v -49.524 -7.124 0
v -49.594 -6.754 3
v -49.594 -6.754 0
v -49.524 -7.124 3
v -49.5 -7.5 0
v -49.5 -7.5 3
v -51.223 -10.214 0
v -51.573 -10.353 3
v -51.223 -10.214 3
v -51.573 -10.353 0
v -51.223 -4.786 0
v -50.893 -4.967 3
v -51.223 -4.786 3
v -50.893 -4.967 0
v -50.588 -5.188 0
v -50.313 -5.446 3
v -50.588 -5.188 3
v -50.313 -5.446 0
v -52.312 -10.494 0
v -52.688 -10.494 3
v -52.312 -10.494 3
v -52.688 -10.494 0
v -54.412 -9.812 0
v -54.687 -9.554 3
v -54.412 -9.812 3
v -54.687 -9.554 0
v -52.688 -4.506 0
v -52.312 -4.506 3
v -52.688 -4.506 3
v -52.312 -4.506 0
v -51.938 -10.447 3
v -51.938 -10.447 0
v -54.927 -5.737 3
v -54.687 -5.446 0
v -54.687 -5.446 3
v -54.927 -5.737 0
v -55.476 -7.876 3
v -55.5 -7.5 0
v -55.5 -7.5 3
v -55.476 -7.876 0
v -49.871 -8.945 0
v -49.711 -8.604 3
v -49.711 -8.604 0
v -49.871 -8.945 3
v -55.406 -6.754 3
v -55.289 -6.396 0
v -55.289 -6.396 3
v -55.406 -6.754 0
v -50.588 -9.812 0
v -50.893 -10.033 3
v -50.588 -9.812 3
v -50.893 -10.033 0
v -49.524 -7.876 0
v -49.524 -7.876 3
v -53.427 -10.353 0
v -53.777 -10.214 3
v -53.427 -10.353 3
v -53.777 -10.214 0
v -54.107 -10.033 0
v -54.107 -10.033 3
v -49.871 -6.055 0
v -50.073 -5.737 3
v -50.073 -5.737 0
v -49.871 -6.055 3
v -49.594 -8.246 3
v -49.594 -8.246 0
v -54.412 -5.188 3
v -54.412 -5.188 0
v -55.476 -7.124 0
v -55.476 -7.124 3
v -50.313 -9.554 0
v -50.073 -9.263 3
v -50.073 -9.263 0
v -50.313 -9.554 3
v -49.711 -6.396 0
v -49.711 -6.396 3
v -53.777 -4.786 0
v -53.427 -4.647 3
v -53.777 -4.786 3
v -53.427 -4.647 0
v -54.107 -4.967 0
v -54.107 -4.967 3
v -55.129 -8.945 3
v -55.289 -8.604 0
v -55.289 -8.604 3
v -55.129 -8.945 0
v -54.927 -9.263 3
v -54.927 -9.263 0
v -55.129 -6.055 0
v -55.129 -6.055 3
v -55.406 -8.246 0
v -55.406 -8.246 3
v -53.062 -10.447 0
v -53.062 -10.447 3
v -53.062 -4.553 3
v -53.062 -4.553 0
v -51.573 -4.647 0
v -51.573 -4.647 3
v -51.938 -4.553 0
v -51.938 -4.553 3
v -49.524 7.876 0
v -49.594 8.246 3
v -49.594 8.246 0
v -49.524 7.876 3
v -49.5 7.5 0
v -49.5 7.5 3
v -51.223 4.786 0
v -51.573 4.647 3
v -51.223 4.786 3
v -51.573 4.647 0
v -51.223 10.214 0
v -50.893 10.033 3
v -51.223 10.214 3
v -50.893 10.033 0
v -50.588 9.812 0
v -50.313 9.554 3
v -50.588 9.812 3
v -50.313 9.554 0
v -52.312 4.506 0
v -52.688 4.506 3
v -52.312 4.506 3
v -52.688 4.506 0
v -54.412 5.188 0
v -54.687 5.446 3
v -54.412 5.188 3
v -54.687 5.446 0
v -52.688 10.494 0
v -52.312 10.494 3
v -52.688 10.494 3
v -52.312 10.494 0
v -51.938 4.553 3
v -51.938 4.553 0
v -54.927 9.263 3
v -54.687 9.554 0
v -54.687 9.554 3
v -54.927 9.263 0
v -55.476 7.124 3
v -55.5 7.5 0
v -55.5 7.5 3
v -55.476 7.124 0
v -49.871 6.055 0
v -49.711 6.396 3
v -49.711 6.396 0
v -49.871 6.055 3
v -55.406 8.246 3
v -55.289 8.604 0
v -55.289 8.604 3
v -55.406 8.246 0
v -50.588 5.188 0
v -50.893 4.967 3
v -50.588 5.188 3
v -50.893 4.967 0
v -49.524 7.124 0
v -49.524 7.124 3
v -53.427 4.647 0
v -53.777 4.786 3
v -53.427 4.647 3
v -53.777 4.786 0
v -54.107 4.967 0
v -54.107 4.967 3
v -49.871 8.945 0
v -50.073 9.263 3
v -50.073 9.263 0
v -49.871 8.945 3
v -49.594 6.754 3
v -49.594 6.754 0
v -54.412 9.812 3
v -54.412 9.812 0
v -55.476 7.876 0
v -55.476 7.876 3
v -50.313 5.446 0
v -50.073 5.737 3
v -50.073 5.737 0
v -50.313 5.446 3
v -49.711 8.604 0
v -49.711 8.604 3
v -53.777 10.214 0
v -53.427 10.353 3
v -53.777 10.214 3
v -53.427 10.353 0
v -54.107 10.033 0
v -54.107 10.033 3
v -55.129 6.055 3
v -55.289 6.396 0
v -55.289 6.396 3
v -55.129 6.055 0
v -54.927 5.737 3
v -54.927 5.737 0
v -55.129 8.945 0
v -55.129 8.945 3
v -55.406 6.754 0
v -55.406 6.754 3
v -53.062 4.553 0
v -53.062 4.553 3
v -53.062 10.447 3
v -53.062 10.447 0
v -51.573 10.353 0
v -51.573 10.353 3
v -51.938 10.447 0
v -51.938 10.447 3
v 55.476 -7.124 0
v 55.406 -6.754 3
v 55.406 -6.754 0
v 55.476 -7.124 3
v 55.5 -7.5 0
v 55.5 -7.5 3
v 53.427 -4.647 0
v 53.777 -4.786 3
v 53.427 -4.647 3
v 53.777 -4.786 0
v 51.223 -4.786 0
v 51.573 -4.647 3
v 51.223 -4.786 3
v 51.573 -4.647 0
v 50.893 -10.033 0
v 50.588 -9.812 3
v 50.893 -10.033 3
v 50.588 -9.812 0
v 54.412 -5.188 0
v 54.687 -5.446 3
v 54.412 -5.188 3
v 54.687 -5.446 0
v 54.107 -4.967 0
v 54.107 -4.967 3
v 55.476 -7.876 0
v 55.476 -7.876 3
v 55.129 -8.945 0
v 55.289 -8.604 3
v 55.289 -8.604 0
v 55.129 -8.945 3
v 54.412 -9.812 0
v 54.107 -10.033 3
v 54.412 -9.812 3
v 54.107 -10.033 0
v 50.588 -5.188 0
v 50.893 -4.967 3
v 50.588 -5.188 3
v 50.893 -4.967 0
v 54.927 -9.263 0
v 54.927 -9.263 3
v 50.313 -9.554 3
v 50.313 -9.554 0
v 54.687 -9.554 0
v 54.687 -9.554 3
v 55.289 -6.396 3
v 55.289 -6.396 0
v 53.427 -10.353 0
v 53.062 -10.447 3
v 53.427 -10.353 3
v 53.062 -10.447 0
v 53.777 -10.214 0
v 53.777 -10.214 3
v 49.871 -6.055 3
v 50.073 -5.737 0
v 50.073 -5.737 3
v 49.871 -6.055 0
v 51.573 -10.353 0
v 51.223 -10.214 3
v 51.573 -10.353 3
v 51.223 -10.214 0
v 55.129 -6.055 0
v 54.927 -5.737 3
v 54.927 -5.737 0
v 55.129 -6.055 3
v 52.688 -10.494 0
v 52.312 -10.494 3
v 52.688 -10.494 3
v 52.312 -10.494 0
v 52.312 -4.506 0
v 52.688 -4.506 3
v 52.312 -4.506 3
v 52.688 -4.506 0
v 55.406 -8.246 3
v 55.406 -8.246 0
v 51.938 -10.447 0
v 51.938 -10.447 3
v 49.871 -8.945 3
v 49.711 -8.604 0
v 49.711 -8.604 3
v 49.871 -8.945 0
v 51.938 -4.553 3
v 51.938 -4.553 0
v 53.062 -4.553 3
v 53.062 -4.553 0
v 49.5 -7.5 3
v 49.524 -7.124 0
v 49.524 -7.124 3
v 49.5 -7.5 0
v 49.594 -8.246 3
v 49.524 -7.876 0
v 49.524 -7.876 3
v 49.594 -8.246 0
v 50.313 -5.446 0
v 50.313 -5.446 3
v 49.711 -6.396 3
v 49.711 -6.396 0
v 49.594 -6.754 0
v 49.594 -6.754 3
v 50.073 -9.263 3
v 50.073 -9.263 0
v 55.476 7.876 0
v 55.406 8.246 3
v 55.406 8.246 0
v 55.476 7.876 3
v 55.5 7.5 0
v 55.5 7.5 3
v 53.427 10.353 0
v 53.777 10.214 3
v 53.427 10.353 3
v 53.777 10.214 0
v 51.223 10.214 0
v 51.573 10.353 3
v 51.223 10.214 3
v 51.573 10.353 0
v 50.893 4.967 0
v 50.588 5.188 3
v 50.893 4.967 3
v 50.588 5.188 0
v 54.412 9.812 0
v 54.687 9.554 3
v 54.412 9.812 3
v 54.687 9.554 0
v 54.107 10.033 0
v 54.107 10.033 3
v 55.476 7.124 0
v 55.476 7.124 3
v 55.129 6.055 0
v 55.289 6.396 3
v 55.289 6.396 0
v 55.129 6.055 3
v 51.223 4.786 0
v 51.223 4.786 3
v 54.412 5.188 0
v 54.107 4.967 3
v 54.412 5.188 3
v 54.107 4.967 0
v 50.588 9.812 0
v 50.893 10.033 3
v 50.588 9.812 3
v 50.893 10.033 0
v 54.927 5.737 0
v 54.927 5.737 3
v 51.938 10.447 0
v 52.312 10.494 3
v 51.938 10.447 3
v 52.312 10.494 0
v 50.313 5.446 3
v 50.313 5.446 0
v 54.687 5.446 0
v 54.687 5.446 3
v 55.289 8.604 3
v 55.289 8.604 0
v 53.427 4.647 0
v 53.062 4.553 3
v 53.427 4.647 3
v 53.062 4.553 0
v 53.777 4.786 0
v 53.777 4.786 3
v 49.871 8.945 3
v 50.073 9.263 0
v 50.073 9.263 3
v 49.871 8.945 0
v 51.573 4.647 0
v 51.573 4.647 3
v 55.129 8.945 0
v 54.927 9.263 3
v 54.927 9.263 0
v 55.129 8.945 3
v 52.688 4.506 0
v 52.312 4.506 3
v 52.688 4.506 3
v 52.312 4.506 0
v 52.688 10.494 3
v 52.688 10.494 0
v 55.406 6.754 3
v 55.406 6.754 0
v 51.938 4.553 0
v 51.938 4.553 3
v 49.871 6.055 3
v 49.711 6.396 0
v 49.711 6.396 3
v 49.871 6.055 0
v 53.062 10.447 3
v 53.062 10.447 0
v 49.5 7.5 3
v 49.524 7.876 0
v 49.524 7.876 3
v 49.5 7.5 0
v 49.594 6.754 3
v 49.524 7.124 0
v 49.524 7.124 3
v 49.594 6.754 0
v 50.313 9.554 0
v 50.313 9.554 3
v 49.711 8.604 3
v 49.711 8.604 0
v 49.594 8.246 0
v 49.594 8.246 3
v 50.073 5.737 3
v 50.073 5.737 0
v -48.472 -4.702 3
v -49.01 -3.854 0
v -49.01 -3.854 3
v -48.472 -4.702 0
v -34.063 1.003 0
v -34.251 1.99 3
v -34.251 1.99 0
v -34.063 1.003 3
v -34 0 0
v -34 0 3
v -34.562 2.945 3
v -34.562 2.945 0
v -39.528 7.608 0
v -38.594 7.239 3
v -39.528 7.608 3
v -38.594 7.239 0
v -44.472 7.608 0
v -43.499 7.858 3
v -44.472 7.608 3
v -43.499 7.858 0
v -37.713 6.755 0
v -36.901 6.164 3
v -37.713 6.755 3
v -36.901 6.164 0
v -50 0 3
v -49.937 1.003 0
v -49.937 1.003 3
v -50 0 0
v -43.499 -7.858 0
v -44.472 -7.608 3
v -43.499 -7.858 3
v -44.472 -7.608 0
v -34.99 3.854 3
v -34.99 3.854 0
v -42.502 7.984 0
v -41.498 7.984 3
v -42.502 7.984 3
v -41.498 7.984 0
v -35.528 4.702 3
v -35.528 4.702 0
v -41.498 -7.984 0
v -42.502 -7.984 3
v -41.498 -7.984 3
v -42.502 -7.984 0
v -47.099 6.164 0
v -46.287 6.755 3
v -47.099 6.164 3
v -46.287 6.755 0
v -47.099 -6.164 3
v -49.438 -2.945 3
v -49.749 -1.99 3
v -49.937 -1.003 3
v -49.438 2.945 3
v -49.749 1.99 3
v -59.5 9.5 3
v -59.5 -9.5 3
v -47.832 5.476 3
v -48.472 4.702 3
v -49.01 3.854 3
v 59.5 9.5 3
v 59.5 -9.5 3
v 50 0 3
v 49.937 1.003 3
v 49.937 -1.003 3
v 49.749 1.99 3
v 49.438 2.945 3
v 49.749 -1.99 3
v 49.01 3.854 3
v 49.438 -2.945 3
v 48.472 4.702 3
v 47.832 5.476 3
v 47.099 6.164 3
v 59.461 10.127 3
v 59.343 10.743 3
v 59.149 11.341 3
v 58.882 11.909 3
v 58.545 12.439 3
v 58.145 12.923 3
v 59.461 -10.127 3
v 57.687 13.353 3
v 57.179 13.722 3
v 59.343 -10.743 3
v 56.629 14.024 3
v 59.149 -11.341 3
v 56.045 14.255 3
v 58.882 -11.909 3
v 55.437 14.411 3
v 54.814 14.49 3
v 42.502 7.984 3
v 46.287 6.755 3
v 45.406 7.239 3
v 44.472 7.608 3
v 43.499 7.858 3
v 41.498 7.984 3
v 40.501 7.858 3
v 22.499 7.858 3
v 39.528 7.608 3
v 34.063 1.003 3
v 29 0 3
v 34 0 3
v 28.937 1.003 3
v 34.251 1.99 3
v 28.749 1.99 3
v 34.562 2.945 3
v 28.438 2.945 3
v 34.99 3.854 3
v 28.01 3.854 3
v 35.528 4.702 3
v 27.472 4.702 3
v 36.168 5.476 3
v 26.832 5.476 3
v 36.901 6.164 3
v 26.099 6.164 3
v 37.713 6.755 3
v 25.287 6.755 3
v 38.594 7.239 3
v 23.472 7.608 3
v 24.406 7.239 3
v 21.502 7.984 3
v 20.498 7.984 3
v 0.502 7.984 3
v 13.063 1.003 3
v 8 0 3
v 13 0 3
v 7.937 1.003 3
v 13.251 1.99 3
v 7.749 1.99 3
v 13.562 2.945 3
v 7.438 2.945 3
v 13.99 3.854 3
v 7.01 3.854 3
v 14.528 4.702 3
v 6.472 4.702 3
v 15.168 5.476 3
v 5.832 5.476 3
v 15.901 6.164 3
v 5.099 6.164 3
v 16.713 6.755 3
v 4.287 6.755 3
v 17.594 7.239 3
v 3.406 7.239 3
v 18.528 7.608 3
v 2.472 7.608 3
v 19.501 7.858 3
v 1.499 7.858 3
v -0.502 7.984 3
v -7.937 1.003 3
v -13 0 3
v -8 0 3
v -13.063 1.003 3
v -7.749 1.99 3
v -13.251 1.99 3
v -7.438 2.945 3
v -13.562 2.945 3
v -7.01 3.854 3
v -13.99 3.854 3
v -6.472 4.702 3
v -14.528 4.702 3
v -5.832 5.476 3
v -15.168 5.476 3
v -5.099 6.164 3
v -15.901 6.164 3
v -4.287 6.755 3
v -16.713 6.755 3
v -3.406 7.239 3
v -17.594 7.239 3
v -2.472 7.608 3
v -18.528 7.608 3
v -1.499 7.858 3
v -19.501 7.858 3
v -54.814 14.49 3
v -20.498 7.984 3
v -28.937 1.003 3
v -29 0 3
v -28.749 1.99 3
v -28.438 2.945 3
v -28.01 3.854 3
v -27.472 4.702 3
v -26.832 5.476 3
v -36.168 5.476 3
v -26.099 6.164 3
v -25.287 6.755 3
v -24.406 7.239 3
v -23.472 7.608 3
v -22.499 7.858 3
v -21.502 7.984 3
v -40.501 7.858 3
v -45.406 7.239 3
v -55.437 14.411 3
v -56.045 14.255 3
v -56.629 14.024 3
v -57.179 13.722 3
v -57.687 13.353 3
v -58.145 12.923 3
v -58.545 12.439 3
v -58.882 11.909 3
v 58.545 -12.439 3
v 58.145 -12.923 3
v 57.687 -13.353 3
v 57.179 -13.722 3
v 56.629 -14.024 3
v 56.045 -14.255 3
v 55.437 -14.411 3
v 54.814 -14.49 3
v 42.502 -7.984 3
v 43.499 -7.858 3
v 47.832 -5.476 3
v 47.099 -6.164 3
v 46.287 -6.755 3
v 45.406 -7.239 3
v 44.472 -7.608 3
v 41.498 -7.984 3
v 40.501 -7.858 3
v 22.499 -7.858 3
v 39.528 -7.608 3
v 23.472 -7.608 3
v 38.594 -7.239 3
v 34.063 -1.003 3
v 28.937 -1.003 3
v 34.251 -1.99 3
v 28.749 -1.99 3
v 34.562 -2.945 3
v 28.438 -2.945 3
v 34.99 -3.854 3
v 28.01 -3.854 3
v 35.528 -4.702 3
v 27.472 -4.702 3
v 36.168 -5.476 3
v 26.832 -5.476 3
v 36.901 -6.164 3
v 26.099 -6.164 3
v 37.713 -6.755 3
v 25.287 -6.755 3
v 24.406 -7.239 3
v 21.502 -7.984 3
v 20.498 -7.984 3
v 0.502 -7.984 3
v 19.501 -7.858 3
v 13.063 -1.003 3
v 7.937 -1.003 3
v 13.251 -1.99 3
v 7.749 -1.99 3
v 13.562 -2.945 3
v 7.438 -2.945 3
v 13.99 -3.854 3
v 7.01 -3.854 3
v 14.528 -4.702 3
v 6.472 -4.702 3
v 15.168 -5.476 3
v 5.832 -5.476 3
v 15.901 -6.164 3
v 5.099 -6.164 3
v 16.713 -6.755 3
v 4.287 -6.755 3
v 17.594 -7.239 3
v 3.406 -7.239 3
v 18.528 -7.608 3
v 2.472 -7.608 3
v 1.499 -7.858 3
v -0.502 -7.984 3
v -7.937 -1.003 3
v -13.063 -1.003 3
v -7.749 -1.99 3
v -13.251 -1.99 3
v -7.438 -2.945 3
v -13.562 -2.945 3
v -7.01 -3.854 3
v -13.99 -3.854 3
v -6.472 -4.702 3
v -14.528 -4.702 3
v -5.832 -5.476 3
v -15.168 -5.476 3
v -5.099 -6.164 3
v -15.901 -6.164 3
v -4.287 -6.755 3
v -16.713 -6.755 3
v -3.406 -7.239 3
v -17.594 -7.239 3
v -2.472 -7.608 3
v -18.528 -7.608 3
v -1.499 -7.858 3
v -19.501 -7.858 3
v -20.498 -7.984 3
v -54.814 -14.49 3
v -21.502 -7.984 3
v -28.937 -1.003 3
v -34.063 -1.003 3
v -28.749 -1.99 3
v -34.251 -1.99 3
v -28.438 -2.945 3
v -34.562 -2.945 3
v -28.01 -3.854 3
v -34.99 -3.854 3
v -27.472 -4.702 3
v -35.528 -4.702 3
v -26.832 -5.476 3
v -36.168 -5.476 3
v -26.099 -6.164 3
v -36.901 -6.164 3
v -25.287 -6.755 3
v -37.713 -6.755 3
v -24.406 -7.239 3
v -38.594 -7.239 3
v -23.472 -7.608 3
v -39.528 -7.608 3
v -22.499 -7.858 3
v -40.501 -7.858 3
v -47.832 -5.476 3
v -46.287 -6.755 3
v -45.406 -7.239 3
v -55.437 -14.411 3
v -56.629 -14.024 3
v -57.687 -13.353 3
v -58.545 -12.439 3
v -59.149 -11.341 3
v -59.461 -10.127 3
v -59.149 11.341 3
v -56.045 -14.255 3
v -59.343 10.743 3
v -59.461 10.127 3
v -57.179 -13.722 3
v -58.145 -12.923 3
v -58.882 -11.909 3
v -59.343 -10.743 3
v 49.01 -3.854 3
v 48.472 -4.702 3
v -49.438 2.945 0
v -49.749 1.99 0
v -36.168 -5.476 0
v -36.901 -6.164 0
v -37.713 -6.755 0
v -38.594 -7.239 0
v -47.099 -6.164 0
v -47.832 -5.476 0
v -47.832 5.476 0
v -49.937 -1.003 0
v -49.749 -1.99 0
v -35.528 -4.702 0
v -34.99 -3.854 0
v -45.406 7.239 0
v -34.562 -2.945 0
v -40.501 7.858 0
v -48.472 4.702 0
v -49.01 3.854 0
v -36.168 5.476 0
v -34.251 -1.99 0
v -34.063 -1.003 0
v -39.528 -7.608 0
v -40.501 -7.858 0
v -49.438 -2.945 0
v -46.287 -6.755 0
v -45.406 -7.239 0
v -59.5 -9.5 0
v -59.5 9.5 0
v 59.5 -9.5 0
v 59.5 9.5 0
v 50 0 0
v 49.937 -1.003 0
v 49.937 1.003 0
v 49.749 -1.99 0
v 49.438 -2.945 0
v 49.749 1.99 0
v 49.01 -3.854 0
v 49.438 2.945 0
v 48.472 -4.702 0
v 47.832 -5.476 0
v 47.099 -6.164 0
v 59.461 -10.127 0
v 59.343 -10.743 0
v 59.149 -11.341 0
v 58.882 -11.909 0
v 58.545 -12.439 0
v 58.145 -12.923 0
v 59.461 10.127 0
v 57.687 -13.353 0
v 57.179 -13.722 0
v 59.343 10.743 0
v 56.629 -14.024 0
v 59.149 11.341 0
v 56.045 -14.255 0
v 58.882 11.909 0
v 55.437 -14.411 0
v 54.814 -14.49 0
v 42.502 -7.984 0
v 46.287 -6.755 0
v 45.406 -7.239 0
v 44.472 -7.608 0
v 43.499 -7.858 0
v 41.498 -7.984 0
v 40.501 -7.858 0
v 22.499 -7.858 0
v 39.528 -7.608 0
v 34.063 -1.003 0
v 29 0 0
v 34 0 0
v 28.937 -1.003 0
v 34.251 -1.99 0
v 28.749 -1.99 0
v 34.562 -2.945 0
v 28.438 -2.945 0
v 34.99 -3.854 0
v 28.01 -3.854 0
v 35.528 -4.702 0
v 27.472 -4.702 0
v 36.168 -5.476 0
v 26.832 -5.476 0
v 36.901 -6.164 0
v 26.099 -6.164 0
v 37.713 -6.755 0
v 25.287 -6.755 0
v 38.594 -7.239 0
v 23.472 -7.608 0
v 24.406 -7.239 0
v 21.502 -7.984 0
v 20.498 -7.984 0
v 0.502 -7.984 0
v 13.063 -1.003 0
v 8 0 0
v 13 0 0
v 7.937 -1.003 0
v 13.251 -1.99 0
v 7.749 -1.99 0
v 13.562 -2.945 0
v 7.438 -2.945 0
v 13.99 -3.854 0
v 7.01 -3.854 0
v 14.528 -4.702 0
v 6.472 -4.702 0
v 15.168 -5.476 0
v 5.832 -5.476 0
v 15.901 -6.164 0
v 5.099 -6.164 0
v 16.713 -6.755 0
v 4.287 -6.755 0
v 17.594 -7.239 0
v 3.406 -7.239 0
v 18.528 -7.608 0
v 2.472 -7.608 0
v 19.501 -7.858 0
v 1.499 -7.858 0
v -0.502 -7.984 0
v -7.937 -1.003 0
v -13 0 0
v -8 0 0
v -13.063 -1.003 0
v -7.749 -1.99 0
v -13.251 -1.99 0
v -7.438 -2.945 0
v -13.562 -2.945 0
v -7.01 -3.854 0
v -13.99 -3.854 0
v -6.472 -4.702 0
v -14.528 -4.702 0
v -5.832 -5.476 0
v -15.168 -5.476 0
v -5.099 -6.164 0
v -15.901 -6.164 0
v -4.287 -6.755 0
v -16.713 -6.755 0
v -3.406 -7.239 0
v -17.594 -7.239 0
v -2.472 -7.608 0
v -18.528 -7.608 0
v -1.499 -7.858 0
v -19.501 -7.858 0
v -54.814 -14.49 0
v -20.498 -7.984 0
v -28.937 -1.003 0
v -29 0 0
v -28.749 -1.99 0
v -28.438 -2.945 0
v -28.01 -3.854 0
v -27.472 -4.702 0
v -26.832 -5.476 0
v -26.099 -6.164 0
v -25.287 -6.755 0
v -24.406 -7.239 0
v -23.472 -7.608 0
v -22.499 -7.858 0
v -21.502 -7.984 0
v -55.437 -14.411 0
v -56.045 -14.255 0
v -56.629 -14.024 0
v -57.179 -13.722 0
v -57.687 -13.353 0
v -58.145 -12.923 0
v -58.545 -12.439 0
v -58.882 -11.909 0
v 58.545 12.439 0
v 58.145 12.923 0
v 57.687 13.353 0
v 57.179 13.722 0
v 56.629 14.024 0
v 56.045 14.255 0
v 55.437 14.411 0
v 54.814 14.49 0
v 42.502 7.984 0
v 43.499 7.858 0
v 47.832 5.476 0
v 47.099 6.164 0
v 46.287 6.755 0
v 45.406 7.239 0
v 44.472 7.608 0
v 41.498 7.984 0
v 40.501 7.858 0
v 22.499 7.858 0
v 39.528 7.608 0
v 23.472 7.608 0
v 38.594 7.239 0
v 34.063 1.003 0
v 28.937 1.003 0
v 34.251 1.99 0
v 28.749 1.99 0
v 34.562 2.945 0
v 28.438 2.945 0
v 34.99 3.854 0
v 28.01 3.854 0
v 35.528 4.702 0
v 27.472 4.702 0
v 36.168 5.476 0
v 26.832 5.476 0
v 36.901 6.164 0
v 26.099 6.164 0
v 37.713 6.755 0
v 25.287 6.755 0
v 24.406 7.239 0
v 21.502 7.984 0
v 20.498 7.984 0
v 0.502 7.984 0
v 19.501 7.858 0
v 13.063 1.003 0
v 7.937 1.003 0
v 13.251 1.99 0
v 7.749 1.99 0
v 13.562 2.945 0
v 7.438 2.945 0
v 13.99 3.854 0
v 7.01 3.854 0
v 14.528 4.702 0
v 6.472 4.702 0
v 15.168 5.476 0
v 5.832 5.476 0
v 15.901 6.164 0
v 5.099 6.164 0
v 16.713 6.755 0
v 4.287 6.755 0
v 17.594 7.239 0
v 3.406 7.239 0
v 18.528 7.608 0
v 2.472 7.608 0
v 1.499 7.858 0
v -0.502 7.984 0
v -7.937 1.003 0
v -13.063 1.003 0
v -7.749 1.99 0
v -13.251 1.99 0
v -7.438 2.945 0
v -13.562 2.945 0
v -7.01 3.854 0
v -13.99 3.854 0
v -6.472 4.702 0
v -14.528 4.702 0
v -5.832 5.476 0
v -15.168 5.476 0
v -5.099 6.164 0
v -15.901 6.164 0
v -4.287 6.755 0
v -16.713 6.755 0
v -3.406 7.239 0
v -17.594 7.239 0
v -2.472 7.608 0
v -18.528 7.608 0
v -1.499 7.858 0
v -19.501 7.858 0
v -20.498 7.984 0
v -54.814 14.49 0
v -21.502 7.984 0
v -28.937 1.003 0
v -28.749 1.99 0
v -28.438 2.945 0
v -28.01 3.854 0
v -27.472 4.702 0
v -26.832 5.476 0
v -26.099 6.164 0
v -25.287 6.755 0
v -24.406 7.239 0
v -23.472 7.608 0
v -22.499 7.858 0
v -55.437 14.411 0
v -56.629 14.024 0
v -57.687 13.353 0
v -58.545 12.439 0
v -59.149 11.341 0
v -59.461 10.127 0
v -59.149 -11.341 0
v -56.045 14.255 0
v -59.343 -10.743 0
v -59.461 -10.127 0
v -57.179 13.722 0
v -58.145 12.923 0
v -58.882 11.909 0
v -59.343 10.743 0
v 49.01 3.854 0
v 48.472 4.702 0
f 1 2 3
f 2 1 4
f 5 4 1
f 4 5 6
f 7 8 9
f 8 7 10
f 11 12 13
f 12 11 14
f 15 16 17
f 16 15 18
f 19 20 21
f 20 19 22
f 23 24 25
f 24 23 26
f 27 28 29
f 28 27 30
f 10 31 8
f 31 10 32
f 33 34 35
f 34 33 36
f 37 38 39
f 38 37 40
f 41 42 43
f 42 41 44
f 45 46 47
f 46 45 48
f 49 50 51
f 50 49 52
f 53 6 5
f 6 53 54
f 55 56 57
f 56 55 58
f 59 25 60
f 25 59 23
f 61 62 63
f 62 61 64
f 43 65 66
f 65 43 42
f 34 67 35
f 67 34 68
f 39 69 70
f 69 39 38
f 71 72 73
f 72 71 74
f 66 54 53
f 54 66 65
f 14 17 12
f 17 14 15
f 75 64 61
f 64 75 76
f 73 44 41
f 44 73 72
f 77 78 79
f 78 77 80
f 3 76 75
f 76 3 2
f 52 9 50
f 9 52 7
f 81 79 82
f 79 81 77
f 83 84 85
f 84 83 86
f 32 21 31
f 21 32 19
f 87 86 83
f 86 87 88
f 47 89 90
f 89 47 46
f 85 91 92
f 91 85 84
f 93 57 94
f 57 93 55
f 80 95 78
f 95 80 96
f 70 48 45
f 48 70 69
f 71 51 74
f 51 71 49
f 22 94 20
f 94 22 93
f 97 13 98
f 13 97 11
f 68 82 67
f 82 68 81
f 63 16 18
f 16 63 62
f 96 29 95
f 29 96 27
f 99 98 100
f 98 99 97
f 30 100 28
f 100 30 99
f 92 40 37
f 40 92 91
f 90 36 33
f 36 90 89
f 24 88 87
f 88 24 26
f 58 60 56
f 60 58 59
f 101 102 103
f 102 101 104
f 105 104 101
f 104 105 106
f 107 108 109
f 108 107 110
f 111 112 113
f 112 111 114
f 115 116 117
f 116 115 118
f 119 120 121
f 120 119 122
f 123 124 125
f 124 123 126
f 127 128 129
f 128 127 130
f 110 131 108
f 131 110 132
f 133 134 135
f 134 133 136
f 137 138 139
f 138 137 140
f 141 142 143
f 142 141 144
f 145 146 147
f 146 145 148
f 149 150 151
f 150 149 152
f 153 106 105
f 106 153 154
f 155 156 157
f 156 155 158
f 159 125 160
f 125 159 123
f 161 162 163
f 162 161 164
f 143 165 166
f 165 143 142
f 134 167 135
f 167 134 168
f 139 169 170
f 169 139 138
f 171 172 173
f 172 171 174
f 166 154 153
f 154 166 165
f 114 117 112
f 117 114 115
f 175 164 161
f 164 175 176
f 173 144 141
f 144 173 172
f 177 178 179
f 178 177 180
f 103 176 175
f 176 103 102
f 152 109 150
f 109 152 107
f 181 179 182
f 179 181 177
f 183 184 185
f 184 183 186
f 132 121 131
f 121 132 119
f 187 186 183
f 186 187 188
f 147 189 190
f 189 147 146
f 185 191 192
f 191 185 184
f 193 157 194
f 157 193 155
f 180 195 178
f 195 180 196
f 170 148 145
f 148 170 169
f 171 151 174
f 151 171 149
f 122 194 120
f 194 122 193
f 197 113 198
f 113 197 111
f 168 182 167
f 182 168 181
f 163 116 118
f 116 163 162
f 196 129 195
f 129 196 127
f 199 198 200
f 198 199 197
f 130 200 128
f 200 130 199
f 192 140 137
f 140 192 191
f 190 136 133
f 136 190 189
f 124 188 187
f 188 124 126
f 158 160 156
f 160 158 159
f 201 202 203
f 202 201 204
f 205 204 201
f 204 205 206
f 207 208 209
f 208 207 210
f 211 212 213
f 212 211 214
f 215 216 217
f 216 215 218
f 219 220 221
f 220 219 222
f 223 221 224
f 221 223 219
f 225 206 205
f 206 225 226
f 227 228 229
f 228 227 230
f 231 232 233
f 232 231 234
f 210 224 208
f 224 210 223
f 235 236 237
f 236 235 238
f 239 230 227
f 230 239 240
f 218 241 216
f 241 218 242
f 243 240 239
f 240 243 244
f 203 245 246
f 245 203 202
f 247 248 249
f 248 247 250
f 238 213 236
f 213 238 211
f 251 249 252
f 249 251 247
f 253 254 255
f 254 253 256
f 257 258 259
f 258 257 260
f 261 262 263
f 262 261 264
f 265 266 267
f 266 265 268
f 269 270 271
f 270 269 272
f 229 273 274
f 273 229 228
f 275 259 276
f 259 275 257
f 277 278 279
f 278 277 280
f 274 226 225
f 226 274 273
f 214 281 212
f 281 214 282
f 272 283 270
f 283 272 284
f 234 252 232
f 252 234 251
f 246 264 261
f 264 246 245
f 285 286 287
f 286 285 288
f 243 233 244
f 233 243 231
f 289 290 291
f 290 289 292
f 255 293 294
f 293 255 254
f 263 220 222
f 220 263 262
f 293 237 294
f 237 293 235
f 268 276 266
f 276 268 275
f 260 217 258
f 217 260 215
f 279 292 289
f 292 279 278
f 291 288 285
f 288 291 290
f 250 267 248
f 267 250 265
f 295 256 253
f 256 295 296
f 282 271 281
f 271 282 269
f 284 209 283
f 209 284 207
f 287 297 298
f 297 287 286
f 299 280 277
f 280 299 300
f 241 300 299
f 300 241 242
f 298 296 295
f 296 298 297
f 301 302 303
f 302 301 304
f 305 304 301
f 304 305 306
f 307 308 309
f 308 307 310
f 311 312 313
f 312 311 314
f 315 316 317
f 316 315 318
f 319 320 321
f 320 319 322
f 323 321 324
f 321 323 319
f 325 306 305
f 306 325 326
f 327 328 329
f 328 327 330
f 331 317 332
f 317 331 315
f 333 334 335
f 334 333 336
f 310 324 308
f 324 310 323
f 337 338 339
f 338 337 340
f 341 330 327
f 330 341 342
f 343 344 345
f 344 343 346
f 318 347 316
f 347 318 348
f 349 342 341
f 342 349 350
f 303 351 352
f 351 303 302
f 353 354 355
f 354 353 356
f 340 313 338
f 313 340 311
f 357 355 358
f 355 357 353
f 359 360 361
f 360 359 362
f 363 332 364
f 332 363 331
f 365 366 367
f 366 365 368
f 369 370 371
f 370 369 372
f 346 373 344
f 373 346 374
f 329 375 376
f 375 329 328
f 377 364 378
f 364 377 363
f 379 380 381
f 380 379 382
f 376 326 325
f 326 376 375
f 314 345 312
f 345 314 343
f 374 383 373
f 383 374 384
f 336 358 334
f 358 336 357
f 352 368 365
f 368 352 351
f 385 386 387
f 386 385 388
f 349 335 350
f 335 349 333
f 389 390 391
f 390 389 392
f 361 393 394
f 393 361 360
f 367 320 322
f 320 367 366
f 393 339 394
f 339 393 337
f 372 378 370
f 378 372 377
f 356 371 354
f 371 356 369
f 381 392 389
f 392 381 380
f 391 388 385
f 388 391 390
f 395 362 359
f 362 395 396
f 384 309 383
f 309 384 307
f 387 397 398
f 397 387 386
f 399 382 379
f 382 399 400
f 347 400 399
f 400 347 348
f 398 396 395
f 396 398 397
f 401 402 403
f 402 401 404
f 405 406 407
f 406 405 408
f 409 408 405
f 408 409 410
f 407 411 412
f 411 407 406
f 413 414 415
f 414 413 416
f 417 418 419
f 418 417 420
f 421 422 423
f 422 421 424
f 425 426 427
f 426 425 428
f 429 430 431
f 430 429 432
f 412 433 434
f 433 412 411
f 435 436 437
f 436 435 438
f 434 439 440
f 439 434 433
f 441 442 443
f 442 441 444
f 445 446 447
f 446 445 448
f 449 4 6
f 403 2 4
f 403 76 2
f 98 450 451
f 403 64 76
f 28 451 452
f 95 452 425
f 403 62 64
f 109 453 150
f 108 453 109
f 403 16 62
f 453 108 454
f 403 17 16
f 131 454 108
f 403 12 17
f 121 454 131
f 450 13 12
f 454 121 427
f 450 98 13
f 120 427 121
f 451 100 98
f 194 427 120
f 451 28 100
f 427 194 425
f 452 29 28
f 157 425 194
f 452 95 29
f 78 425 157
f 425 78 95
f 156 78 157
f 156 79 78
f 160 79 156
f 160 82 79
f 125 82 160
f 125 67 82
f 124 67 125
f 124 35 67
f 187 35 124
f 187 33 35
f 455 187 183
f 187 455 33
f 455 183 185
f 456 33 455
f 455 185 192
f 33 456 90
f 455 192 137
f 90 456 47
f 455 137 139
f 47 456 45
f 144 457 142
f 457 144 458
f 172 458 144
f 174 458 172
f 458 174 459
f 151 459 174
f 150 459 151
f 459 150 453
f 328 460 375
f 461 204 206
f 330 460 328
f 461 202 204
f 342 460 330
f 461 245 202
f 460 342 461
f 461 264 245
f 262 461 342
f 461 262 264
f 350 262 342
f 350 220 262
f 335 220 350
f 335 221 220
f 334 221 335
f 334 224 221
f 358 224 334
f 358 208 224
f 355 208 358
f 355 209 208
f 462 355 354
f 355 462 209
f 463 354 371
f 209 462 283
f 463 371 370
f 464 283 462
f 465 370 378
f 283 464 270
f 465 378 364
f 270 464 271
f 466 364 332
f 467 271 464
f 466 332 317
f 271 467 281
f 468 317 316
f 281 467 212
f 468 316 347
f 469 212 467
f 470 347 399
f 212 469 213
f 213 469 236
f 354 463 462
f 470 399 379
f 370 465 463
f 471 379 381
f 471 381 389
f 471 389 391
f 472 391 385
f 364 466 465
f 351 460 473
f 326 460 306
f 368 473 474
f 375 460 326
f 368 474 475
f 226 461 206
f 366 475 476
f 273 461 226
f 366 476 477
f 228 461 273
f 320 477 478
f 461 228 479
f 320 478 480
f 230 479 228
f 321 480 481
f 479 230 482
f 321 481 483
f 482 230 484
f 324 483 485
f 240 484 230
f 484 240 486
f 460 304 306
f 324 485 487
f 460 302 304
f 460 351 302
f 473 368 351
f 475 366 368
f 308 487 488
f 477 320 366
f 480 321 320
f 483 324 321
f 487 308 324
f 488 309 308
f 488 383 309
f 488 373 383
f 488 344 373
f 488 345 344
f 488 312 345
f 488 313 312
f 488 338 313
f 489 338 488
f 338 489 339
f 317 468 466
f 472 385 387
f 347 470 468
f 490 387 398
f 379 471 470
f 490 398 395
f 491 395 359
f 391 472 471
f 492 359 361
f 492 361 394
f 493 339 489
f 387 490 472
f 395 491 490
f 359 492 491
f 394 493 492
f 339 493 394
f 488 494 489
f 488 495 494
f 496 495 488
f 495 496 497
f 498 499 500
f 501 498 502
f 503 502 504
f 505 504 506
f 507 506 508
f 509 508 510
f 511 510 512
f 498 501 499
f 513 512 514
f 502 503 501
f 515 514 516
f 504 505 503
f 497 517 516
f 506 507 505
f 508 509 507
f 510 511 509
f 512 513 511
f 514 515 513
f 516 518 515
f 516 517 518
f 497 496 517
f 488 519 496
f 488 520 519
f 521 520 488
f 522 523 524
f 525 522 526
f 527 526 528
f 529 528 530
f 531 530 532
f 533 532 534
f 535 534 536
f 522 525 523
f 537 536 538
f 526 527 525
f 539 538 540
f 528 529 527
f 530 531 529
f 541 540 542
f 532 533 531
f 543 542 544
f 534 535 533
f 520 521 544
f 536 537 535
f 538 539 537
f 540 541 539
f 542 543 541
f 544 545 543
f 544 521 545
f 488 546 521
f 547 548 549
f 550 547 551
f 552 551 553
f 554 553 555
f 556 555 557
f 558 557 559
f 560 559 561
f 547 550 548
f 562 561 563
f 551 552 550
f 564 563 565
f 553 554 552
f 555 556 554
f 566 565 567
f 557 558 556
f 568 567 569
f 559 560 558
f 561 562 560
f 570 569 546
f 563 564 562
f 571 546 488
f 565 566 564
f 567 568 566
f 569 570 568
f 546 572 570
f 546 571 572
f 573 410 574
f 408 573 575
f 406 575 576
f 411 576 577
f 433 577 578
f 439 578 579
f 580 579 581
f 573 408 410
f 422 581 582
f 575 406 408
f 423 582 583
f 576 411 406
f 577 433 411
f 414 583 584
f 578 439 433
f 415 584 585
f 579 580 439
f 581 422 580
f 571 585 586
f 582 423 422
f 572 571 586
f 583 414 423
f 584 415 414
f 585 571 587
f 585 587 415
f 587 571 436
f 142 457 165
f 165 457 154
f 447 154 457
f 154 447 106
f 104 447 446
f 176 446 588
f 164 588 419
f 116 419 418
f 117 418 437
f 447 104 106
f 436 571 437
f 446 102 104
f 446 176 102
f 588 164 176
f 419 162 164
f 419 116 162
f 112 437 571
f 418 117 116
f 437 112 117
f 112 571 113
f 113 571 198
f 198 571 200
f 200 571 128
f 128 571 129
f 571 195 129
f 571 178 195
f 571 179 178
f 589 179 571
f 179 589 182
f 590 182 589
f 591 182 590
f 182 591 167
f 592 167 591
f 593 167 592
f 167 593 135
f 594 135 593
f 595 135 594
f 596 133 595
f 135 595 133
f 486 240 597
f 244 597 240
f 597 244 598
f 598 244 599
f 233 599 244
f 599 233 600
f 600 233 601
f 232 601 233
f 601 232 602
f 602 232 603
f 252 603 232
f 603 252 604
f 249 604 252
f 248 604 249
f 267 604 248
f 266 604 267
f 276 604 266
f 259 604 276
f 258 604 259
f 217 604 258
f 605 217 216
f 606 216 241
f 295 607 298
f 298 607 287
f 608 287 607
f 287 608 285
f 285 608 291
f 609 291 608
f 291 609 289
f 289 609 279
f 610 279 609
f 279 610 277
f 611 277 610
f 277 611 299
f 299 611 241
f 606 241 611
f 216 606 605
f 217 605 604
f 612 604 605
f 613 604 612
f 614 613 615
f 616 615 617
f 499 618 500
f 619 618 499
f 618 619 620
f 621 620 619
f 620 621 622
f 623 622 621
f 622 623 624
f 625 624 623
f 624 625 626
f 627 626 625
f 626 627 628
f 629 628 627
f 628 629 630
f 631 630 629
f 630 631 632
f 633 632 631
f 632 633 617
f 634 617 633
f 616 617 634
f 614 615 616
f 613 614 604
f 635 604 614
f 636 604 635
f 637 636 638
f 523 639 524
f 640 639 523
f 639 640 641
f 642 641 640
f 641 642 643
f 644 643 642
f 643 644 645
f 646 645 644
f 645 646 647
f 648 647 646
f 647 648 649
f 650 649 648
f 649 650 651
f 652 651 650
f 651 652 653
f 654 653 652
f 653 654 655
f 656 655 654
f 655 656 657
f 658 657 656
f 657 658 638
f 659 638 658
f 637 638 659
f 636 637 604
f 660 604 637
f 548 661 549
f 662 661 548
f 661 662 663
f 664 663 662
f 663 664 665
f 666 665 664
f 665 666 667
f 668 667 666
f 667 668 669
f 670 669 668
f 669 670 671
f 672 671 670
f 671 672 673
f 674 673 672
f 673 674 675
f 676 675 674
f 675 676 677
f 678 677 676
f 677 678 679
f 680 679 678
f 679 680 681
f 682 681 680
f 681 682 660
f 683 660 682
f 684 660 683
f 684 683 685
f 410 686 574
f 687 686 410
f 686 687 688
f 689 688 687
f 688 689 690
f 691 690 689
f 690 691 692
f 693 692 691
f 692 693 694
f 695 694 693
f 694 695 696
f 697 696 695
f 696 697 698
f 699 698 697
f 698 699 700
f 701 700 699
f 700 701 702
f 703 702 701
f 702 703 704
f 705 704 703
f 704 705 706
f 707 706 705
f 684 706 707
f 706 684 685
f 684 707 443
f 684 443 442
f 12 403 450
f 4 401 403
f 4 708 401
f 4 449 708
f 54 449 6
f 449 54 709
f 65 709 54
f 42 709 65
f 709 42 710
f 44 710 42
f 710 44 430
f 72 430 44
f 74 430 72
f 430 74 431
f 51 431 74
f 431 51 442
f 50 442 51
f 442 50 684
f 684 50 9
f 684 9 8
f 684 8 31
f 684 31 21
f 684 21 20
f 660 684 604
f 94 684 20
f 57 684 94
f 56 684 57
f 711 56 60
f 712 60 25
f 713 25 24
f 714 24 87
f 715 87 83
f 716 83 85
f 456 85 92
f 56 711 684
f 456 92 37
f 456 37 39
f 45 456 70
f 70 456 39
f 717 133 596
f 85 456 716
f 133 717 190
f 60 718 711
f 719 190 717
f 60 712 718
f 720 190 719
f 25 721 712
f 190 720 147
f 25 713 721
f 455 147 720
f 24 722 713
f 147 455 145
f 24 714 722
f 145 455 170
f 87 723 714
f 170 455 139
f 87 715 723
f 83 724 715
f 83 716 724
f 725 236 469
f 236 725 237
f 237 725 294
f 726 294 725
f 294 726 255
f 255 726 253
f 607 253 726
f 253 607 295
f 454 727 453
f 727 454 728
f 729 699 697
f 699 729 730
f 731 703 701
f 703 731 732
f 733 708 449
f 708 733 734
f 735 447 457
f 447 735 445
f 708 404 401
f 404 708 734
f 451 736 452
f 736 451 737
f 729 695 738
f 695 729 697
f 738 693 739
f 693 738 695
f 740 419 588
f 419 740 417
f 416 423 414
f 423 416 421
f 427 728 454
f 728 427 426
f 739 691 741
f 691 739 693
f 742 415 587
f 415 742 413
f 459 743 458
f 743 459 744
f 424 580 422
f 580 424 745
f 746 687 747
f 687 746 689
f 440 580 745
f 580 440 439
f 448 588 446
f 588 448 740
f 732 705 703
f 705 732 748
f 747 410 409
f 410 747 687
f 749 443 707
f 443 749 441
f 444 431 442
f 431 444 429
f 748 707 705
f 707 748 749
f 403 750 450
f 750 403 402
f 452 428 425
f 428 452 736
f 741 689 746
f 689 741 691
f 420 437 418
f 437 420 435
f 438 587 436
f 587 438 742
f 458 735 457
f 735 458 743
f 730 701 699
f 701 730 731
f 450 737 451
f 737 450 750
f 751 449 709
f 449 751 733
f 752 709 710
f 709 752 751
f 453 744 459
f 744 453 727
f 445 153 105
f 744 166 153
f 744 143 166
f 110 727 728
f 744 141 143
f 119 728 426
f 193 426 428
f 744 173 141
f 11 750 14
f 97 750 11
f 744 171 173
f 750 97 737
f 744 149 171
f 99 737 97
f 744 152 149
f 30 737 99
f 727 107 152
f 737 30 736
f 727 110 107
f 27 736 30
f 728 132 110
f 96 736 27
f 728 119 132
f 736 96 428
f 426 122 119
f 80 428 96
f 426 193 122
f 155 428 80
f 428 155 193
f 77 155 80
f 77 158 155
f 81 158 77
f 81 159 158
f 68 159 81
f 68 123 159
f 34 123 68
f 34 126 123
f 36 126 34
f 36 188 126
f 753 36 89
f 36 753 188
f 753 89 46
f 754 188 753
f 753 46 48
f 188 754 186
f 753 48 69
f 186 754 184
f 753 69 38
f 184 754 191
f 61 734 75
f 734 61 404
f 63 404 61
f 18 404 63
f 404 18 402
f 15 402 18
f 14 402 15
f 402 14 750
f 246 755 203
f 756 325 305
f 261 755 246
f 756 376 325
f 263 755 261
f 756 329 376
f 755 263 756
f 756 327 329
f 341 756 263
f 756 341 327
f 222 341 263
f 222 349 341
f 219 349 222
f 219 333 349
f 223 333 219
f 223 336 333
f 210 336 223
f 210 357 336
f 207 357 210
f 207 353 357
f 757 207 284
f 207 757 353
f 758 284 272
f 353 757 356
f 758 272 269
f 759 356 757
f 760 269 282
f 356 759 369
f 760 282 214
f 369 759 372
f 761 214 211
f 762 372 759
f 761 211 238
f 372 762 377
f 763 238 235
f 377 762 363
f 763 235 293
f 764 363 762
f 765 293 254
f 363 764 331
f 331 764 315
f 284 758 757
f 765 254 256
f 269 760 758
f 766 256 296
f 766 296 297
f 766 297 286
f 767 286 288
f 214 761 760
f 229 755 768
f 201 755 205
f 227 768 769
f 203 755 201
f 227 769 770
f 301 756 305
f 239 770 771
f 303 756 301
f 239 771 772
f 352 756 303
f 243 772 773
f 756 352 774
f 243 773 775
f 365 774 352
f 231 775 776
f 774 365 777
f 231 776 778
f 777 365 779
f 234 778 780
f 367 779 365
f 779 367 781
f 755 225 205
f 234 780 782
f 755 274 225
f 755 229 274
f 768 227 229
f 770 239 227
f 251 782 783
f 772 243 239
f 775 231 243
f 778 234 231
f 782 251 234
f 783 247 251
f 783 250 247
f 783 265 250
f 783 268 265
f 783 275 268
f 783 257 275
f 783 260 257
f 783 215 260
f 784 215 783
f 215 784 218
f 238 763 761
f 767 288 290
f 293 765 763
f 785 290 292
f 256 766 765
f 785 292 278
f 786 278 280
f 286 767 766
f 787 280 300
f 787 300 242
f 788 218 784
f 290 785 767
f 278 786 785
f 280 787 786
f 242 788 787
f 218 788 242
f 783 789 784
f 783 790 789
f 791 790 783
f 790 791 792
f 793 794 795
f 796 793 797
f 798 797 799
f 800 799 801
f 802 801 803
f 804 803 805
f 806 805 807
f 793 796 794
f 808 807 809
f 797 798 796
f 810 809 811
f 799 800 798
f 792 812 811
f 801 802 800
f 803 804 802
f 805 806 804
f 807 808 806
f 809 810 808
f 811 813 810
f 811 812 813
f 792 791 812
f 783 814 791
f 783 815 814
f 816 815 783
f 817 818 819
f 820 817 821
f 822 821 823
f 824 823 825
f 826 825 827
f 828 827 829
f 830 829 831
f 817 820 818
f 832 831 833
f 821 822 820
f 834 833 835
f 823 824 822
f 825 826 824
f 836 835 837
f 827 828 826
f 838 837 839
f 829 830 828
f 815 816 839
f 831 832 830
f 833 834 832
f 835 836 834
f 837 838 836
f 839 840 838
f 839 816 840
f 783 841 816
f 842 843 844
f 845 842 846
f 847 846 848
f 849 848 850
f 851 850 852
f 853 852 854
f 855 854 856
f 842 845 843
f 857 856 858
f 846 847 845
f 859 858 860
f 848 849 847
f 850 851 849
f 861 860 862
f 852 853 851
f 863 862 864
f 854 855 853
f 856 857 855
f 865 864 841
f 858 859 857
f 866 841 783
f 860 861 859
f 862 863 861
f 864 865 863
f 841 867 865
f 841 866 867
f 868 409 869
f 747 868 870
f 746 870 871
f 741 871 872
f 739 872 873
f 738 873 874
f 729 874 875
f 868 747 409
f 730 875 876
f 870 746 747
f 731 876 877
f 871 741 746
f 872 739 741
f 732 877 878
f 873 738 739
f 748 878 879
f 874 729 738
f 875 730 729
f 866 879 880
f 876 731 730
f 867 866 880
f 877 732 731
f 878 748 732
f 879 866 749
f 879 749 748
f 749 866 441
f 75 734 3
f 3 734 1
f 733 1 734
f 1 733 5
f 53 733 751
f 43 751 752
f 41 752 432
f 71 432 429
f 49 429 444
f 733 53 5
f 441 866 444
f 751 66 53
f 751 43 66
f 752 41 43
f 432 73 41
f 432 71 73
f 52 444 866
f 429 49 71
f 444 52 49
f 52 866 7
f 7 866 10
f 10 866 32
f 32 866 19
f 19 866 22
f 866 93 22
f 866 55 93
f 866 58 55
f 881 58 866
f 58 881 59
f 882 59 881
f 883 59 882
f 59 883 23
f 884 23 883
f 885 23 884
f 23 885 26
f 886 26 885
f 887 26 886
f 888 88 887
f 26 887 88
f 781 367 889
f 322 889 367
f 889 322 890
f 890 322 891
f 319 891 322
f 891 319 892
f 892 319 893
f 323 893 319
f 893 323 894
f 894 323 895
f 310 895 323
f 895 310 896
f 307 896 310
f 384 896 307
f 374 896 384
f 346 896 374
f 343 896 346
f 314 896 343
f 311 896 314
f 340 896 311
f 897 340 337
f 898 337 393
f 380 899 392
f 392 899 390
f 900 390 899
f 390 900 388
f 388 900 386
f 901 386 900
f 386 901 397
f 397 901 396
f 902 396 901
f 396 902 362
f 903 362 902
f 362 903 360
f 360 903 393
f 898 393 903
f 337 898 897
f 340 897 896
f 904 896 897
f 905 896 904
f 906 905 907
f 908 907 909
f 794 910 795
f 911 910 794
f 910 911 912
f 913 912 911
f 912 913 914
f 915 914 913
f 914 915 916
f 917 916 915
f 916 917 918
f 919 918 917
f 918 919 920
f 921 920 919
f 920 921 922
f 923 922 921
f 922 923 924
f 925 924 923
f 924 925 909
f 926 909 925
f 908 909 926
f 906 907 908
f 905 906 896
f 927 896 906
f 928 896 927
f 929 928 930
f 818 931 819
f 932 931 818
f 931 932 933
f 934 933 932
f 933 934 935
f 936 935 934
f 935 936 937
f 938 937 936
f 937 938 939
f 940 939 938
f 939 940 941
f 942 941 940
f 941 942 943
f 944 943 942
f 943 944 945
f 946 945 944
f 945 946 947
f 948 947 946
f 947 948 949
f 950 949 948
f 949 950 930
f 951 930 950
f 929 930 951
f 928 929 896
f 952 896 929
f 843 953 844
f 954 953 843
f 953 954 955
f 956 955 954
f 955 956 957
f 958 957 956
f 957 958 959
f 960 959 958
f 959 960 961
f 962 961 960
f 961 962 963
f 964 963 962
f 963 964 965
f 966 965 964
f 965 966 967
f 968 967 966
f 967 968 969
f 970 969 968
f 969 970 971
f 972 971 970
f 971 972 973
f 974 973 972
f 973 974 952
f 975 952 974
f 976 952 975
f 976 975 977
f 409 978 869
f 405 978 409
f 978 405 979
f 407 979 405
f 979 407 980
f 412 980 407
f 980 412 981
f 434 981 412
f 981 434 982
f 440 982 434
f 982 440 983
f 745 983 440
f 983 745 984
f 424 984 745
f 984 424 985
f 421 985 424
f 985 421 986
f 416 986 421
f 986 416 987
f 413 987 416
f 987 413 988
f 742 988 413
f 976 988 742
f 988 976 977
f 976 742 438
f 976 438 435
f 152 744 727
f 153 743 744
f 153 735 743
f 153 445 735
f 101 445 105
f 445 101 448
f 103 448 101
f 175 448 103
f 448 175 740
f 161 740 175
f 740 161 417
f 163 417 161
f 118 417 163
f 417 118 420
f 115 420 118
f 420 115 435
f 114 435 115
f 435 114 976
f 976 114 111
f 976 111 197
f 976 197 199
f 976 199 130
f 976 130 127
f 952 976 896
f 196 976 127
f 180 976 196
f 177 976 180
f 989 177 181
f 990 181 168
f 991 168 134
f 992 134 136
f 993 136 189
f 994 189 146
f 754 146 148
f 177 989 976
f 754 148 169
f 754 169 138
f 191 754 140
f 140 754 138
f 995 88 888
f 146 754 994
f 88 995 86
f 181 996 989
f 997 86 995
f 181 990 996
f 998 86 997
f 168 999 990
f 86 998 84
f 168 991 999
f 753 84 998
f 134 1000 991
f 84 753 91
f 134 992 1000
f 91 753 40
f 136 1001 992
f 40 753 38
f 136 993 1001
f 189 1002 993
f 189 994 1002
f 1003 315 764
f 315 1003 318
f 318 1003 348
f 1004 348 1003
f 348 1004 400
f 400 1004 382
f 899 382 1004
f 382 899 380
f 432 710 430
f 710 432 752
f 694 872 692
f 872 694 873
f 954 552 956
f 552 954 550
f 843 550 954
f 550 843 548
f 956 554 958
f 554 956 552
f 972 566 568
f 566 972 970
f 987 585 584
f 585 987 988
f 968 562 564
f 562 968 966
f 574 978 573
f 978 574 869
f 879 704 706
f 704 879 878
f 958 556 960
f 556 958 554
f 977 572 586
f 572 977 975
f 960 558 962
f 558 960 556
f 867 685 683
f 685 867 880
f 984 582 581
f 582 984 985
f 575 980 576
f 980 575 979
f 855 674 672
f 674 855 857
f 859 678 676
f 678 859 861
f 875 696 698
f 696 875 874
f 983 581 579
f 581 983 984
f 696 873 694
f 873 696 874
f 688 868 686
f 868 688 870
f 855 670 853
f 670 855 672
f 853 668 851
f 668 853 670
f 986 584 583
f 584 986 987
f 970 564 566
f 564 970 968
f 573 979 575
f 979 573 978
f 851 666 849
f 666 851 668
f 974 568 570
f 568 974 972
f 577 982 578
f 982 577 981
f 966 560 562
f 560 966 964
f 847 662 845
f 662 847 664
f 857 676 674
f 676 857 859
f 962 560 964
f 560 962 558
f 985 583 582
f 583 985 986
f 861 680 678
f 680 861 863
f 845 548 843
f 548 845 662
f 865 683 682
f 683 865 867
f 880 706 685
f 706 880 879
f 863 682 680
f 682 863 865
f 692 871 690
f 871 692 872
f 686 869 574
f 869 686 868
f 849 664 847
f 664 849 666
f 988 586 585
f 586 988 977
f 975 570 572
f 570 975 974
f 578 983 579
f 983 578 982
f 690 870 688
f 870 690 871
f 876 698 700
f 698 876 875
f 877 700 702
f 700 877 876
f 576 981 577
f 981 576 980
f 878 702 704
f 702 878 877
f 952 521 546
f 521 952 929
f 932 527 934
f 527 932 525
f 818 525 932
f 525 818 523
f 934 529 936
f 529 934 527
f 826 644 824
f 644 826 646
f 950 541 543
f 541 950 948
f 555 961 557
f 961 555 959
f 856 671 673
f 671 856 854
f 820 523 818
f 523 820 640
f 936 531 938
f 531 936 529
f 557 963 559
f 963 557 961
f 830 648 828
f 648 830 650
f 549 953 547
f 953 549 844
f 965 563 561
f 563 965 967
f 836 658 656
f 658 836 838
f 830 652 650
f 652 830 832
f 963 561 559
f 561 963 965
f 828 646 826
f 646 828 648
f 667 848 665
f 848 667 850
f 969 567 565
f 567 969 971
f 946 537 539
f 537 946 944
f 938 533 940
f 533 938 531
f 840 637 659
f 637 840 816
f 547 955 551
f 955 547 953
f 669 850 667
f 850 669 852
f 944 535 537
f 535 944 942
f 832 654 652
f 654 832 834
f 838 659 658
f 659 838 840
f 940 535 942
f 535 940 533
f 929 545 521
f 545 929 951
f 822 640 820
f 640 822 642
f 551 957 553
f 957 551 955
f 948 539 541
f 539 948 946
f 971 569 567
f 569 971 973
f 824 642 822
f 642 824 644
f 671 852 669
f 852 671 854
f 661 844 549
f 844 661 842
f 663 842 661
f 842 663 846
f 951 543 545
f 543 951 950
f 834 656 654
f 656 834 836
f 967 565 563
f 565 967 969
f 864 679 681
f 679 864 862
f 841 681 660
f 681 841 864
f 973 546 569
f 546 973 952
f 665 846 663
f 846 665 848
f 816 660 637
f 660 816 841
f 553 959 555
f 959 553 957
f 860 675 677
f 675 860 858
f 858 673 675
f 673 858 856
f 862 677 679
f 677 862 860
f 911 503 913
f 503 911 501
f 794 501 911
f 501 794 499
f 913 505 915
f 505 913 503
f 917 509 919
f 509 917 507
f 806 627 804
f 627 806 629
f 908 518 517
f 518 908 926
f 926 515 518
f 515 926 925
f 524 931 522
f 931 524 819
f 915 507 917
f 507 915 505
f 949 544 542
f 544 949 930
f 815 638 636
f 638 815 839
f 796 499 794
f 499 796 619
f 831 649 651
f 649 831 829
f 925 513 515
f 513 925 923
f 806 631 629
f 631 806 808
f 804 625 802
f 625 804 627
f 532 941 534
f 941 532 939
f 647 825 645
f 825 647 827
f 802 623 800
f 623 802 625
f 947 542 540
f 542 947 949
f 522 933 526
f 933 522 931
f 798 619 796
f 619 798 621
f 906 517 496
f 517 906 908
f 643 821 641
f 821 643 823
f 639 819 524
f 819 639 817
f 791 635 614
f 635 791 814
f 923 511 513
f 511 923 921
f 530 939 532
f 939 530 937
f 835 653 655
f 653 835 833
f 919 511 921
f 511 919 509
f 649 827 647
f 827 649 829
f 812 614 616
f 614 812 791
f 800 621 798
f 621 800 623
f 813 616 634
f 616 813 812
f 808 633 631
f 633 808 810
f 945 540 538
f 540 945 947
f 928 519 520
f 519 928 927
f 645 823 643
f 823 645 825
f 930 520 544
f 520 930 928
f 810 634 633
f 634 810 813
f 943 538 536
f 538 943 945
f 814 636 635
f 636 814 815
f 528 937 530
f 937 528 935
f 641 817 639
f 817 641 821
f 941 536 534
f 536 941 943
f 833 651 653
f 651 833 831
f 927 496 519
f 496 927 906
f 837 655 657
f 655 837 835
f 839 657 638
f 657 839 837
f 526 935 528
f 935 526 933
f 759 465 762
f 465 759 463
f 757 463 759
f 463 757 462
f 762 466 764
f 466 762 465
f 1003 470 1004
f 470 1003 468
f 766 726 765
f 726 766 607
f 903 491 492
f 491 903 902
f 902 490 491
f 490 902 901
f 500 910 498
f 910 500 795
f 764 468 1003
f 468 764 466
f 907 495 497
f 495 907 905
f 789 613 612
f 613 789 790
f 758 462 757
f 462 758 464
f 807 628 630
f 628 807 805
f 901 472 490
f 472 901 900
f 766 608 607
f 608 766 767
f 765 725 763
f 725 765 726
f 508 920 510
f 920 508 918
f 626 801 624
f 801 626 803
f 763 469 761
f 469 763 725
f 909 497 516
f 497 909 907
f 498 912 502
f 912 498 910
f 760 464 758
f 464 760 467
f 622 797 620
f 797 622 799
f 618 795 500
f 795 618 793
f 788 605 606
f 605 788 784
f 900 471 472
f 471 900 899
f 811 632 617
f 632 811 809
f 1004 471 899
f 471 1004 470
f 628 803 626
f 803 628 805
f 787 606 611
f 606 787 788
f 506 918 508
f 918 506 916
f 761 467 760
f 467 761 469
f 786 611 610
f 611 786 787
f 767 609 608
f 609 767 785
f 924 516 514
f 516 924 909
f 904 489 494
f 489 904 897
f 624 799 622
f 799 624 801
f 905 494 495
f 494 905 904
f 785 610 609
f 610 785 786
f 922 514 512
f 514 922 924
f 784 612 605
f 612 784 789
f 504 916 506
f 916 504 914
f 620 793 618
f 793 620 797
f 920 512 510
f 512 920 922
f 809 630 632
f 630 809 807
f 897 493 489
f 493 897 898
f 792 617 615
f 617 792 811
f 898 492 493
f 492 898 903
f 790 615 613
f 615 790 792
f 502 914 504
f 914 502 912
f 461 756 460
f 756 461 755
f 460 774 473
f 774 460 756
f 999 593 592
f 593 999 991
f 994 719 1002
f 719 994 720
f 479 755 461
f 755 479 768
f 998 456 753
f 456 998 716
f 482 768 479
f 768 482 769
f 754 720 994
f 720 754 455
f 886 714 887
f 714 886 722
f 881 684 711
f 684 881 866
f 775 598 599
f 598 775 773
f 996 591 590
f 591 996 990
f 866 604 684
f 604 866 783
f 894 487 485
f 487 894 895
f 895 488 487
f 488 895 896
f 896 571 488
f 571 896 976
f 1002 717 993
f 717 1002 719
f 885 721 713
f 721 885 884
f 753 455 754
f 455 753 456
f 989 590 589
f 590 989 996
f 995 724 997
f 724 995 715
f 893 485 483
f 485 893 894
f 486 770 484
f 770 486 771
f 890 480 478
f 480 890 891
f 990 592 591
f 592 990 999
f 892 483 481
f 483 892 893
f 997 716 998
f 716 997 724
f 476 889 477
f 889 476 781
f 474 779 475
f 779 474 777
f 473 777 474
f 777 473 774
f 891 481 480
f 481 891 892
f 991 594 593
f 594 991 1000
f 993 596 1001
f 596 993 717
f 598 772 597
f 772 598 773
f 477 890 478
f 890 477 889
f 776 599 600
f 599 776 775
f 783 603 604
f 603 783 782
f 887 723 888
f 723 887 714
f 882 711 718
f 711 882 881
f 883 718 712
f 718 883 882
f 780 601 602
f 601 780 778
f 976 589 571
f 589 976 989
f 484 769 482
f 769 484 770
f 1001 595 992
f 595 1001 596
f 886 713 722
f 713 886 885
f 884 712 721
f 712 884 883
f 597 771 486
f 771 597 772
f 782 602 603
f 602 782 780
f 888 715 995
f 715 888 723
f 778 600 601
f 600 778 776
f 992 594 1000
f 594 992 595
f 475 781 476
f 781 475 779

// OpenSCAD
$fn = 50;


difference() {
	union() {
		hull() {
			translate(v = [-54.5000000000, 9.5000000000, 0]) {
				cylinder(h = 3, r = 5);
			}
			translate(v = [54.5000000000, 9.5000000000, 0]) {
				cylinder(h = 3, r = 5);
			}
			translate(v = [-54.5000000000, -9.5000000000, 0]) {
				cylinder(h = 3, r = 5);
			}
			translate(v = [54.5000000000, -9.5000000000, 0]) {
				cylinder(h = 3, r = 5);
			}
		}
	}
	union() {
		#translate(v = [-52.5000000000, -7.5000000000, -100.0000000000]) {
			cylinder(h = 200, r = 3.0000000000);
		}
		#translate(v = [-52.5000000000, 7.5000000000, -100.0000000000]) {
			cylinder(h = 200, r = 3.0000000000);
		}
		#translate(v = [52.5000000000, -7.5000000000, -100.0000000000]) {
			cylinder(h = 200, r = 3.0000000000);
		}
		#translate(v = [52.5000000000, 7.5000000000, -100.0000000000]) {
			cylinder(h = 200, r = 3.0000000000);
		}
		#translate(v = [-42.0000000000, 0, 0]) {
			cylinder(h = 3, r = 8.0000000000);
		}
		#translate(v = [-21.0000000000, 0, 0]) {
			cylinder(h = 3, r = 8.0000000000);
		}
		#cylinder(h = 3, r = 8.0000000000);
		#translate(v = [21.0000000000, 0, 0]) {
			cylinder(h = 3, r = 8.0000000000);
		}
		#translate(v = [42.0000000000, 0, 0]) {
			cylinder(h = 3, r = 8.0000000000);
		}
	}
}
